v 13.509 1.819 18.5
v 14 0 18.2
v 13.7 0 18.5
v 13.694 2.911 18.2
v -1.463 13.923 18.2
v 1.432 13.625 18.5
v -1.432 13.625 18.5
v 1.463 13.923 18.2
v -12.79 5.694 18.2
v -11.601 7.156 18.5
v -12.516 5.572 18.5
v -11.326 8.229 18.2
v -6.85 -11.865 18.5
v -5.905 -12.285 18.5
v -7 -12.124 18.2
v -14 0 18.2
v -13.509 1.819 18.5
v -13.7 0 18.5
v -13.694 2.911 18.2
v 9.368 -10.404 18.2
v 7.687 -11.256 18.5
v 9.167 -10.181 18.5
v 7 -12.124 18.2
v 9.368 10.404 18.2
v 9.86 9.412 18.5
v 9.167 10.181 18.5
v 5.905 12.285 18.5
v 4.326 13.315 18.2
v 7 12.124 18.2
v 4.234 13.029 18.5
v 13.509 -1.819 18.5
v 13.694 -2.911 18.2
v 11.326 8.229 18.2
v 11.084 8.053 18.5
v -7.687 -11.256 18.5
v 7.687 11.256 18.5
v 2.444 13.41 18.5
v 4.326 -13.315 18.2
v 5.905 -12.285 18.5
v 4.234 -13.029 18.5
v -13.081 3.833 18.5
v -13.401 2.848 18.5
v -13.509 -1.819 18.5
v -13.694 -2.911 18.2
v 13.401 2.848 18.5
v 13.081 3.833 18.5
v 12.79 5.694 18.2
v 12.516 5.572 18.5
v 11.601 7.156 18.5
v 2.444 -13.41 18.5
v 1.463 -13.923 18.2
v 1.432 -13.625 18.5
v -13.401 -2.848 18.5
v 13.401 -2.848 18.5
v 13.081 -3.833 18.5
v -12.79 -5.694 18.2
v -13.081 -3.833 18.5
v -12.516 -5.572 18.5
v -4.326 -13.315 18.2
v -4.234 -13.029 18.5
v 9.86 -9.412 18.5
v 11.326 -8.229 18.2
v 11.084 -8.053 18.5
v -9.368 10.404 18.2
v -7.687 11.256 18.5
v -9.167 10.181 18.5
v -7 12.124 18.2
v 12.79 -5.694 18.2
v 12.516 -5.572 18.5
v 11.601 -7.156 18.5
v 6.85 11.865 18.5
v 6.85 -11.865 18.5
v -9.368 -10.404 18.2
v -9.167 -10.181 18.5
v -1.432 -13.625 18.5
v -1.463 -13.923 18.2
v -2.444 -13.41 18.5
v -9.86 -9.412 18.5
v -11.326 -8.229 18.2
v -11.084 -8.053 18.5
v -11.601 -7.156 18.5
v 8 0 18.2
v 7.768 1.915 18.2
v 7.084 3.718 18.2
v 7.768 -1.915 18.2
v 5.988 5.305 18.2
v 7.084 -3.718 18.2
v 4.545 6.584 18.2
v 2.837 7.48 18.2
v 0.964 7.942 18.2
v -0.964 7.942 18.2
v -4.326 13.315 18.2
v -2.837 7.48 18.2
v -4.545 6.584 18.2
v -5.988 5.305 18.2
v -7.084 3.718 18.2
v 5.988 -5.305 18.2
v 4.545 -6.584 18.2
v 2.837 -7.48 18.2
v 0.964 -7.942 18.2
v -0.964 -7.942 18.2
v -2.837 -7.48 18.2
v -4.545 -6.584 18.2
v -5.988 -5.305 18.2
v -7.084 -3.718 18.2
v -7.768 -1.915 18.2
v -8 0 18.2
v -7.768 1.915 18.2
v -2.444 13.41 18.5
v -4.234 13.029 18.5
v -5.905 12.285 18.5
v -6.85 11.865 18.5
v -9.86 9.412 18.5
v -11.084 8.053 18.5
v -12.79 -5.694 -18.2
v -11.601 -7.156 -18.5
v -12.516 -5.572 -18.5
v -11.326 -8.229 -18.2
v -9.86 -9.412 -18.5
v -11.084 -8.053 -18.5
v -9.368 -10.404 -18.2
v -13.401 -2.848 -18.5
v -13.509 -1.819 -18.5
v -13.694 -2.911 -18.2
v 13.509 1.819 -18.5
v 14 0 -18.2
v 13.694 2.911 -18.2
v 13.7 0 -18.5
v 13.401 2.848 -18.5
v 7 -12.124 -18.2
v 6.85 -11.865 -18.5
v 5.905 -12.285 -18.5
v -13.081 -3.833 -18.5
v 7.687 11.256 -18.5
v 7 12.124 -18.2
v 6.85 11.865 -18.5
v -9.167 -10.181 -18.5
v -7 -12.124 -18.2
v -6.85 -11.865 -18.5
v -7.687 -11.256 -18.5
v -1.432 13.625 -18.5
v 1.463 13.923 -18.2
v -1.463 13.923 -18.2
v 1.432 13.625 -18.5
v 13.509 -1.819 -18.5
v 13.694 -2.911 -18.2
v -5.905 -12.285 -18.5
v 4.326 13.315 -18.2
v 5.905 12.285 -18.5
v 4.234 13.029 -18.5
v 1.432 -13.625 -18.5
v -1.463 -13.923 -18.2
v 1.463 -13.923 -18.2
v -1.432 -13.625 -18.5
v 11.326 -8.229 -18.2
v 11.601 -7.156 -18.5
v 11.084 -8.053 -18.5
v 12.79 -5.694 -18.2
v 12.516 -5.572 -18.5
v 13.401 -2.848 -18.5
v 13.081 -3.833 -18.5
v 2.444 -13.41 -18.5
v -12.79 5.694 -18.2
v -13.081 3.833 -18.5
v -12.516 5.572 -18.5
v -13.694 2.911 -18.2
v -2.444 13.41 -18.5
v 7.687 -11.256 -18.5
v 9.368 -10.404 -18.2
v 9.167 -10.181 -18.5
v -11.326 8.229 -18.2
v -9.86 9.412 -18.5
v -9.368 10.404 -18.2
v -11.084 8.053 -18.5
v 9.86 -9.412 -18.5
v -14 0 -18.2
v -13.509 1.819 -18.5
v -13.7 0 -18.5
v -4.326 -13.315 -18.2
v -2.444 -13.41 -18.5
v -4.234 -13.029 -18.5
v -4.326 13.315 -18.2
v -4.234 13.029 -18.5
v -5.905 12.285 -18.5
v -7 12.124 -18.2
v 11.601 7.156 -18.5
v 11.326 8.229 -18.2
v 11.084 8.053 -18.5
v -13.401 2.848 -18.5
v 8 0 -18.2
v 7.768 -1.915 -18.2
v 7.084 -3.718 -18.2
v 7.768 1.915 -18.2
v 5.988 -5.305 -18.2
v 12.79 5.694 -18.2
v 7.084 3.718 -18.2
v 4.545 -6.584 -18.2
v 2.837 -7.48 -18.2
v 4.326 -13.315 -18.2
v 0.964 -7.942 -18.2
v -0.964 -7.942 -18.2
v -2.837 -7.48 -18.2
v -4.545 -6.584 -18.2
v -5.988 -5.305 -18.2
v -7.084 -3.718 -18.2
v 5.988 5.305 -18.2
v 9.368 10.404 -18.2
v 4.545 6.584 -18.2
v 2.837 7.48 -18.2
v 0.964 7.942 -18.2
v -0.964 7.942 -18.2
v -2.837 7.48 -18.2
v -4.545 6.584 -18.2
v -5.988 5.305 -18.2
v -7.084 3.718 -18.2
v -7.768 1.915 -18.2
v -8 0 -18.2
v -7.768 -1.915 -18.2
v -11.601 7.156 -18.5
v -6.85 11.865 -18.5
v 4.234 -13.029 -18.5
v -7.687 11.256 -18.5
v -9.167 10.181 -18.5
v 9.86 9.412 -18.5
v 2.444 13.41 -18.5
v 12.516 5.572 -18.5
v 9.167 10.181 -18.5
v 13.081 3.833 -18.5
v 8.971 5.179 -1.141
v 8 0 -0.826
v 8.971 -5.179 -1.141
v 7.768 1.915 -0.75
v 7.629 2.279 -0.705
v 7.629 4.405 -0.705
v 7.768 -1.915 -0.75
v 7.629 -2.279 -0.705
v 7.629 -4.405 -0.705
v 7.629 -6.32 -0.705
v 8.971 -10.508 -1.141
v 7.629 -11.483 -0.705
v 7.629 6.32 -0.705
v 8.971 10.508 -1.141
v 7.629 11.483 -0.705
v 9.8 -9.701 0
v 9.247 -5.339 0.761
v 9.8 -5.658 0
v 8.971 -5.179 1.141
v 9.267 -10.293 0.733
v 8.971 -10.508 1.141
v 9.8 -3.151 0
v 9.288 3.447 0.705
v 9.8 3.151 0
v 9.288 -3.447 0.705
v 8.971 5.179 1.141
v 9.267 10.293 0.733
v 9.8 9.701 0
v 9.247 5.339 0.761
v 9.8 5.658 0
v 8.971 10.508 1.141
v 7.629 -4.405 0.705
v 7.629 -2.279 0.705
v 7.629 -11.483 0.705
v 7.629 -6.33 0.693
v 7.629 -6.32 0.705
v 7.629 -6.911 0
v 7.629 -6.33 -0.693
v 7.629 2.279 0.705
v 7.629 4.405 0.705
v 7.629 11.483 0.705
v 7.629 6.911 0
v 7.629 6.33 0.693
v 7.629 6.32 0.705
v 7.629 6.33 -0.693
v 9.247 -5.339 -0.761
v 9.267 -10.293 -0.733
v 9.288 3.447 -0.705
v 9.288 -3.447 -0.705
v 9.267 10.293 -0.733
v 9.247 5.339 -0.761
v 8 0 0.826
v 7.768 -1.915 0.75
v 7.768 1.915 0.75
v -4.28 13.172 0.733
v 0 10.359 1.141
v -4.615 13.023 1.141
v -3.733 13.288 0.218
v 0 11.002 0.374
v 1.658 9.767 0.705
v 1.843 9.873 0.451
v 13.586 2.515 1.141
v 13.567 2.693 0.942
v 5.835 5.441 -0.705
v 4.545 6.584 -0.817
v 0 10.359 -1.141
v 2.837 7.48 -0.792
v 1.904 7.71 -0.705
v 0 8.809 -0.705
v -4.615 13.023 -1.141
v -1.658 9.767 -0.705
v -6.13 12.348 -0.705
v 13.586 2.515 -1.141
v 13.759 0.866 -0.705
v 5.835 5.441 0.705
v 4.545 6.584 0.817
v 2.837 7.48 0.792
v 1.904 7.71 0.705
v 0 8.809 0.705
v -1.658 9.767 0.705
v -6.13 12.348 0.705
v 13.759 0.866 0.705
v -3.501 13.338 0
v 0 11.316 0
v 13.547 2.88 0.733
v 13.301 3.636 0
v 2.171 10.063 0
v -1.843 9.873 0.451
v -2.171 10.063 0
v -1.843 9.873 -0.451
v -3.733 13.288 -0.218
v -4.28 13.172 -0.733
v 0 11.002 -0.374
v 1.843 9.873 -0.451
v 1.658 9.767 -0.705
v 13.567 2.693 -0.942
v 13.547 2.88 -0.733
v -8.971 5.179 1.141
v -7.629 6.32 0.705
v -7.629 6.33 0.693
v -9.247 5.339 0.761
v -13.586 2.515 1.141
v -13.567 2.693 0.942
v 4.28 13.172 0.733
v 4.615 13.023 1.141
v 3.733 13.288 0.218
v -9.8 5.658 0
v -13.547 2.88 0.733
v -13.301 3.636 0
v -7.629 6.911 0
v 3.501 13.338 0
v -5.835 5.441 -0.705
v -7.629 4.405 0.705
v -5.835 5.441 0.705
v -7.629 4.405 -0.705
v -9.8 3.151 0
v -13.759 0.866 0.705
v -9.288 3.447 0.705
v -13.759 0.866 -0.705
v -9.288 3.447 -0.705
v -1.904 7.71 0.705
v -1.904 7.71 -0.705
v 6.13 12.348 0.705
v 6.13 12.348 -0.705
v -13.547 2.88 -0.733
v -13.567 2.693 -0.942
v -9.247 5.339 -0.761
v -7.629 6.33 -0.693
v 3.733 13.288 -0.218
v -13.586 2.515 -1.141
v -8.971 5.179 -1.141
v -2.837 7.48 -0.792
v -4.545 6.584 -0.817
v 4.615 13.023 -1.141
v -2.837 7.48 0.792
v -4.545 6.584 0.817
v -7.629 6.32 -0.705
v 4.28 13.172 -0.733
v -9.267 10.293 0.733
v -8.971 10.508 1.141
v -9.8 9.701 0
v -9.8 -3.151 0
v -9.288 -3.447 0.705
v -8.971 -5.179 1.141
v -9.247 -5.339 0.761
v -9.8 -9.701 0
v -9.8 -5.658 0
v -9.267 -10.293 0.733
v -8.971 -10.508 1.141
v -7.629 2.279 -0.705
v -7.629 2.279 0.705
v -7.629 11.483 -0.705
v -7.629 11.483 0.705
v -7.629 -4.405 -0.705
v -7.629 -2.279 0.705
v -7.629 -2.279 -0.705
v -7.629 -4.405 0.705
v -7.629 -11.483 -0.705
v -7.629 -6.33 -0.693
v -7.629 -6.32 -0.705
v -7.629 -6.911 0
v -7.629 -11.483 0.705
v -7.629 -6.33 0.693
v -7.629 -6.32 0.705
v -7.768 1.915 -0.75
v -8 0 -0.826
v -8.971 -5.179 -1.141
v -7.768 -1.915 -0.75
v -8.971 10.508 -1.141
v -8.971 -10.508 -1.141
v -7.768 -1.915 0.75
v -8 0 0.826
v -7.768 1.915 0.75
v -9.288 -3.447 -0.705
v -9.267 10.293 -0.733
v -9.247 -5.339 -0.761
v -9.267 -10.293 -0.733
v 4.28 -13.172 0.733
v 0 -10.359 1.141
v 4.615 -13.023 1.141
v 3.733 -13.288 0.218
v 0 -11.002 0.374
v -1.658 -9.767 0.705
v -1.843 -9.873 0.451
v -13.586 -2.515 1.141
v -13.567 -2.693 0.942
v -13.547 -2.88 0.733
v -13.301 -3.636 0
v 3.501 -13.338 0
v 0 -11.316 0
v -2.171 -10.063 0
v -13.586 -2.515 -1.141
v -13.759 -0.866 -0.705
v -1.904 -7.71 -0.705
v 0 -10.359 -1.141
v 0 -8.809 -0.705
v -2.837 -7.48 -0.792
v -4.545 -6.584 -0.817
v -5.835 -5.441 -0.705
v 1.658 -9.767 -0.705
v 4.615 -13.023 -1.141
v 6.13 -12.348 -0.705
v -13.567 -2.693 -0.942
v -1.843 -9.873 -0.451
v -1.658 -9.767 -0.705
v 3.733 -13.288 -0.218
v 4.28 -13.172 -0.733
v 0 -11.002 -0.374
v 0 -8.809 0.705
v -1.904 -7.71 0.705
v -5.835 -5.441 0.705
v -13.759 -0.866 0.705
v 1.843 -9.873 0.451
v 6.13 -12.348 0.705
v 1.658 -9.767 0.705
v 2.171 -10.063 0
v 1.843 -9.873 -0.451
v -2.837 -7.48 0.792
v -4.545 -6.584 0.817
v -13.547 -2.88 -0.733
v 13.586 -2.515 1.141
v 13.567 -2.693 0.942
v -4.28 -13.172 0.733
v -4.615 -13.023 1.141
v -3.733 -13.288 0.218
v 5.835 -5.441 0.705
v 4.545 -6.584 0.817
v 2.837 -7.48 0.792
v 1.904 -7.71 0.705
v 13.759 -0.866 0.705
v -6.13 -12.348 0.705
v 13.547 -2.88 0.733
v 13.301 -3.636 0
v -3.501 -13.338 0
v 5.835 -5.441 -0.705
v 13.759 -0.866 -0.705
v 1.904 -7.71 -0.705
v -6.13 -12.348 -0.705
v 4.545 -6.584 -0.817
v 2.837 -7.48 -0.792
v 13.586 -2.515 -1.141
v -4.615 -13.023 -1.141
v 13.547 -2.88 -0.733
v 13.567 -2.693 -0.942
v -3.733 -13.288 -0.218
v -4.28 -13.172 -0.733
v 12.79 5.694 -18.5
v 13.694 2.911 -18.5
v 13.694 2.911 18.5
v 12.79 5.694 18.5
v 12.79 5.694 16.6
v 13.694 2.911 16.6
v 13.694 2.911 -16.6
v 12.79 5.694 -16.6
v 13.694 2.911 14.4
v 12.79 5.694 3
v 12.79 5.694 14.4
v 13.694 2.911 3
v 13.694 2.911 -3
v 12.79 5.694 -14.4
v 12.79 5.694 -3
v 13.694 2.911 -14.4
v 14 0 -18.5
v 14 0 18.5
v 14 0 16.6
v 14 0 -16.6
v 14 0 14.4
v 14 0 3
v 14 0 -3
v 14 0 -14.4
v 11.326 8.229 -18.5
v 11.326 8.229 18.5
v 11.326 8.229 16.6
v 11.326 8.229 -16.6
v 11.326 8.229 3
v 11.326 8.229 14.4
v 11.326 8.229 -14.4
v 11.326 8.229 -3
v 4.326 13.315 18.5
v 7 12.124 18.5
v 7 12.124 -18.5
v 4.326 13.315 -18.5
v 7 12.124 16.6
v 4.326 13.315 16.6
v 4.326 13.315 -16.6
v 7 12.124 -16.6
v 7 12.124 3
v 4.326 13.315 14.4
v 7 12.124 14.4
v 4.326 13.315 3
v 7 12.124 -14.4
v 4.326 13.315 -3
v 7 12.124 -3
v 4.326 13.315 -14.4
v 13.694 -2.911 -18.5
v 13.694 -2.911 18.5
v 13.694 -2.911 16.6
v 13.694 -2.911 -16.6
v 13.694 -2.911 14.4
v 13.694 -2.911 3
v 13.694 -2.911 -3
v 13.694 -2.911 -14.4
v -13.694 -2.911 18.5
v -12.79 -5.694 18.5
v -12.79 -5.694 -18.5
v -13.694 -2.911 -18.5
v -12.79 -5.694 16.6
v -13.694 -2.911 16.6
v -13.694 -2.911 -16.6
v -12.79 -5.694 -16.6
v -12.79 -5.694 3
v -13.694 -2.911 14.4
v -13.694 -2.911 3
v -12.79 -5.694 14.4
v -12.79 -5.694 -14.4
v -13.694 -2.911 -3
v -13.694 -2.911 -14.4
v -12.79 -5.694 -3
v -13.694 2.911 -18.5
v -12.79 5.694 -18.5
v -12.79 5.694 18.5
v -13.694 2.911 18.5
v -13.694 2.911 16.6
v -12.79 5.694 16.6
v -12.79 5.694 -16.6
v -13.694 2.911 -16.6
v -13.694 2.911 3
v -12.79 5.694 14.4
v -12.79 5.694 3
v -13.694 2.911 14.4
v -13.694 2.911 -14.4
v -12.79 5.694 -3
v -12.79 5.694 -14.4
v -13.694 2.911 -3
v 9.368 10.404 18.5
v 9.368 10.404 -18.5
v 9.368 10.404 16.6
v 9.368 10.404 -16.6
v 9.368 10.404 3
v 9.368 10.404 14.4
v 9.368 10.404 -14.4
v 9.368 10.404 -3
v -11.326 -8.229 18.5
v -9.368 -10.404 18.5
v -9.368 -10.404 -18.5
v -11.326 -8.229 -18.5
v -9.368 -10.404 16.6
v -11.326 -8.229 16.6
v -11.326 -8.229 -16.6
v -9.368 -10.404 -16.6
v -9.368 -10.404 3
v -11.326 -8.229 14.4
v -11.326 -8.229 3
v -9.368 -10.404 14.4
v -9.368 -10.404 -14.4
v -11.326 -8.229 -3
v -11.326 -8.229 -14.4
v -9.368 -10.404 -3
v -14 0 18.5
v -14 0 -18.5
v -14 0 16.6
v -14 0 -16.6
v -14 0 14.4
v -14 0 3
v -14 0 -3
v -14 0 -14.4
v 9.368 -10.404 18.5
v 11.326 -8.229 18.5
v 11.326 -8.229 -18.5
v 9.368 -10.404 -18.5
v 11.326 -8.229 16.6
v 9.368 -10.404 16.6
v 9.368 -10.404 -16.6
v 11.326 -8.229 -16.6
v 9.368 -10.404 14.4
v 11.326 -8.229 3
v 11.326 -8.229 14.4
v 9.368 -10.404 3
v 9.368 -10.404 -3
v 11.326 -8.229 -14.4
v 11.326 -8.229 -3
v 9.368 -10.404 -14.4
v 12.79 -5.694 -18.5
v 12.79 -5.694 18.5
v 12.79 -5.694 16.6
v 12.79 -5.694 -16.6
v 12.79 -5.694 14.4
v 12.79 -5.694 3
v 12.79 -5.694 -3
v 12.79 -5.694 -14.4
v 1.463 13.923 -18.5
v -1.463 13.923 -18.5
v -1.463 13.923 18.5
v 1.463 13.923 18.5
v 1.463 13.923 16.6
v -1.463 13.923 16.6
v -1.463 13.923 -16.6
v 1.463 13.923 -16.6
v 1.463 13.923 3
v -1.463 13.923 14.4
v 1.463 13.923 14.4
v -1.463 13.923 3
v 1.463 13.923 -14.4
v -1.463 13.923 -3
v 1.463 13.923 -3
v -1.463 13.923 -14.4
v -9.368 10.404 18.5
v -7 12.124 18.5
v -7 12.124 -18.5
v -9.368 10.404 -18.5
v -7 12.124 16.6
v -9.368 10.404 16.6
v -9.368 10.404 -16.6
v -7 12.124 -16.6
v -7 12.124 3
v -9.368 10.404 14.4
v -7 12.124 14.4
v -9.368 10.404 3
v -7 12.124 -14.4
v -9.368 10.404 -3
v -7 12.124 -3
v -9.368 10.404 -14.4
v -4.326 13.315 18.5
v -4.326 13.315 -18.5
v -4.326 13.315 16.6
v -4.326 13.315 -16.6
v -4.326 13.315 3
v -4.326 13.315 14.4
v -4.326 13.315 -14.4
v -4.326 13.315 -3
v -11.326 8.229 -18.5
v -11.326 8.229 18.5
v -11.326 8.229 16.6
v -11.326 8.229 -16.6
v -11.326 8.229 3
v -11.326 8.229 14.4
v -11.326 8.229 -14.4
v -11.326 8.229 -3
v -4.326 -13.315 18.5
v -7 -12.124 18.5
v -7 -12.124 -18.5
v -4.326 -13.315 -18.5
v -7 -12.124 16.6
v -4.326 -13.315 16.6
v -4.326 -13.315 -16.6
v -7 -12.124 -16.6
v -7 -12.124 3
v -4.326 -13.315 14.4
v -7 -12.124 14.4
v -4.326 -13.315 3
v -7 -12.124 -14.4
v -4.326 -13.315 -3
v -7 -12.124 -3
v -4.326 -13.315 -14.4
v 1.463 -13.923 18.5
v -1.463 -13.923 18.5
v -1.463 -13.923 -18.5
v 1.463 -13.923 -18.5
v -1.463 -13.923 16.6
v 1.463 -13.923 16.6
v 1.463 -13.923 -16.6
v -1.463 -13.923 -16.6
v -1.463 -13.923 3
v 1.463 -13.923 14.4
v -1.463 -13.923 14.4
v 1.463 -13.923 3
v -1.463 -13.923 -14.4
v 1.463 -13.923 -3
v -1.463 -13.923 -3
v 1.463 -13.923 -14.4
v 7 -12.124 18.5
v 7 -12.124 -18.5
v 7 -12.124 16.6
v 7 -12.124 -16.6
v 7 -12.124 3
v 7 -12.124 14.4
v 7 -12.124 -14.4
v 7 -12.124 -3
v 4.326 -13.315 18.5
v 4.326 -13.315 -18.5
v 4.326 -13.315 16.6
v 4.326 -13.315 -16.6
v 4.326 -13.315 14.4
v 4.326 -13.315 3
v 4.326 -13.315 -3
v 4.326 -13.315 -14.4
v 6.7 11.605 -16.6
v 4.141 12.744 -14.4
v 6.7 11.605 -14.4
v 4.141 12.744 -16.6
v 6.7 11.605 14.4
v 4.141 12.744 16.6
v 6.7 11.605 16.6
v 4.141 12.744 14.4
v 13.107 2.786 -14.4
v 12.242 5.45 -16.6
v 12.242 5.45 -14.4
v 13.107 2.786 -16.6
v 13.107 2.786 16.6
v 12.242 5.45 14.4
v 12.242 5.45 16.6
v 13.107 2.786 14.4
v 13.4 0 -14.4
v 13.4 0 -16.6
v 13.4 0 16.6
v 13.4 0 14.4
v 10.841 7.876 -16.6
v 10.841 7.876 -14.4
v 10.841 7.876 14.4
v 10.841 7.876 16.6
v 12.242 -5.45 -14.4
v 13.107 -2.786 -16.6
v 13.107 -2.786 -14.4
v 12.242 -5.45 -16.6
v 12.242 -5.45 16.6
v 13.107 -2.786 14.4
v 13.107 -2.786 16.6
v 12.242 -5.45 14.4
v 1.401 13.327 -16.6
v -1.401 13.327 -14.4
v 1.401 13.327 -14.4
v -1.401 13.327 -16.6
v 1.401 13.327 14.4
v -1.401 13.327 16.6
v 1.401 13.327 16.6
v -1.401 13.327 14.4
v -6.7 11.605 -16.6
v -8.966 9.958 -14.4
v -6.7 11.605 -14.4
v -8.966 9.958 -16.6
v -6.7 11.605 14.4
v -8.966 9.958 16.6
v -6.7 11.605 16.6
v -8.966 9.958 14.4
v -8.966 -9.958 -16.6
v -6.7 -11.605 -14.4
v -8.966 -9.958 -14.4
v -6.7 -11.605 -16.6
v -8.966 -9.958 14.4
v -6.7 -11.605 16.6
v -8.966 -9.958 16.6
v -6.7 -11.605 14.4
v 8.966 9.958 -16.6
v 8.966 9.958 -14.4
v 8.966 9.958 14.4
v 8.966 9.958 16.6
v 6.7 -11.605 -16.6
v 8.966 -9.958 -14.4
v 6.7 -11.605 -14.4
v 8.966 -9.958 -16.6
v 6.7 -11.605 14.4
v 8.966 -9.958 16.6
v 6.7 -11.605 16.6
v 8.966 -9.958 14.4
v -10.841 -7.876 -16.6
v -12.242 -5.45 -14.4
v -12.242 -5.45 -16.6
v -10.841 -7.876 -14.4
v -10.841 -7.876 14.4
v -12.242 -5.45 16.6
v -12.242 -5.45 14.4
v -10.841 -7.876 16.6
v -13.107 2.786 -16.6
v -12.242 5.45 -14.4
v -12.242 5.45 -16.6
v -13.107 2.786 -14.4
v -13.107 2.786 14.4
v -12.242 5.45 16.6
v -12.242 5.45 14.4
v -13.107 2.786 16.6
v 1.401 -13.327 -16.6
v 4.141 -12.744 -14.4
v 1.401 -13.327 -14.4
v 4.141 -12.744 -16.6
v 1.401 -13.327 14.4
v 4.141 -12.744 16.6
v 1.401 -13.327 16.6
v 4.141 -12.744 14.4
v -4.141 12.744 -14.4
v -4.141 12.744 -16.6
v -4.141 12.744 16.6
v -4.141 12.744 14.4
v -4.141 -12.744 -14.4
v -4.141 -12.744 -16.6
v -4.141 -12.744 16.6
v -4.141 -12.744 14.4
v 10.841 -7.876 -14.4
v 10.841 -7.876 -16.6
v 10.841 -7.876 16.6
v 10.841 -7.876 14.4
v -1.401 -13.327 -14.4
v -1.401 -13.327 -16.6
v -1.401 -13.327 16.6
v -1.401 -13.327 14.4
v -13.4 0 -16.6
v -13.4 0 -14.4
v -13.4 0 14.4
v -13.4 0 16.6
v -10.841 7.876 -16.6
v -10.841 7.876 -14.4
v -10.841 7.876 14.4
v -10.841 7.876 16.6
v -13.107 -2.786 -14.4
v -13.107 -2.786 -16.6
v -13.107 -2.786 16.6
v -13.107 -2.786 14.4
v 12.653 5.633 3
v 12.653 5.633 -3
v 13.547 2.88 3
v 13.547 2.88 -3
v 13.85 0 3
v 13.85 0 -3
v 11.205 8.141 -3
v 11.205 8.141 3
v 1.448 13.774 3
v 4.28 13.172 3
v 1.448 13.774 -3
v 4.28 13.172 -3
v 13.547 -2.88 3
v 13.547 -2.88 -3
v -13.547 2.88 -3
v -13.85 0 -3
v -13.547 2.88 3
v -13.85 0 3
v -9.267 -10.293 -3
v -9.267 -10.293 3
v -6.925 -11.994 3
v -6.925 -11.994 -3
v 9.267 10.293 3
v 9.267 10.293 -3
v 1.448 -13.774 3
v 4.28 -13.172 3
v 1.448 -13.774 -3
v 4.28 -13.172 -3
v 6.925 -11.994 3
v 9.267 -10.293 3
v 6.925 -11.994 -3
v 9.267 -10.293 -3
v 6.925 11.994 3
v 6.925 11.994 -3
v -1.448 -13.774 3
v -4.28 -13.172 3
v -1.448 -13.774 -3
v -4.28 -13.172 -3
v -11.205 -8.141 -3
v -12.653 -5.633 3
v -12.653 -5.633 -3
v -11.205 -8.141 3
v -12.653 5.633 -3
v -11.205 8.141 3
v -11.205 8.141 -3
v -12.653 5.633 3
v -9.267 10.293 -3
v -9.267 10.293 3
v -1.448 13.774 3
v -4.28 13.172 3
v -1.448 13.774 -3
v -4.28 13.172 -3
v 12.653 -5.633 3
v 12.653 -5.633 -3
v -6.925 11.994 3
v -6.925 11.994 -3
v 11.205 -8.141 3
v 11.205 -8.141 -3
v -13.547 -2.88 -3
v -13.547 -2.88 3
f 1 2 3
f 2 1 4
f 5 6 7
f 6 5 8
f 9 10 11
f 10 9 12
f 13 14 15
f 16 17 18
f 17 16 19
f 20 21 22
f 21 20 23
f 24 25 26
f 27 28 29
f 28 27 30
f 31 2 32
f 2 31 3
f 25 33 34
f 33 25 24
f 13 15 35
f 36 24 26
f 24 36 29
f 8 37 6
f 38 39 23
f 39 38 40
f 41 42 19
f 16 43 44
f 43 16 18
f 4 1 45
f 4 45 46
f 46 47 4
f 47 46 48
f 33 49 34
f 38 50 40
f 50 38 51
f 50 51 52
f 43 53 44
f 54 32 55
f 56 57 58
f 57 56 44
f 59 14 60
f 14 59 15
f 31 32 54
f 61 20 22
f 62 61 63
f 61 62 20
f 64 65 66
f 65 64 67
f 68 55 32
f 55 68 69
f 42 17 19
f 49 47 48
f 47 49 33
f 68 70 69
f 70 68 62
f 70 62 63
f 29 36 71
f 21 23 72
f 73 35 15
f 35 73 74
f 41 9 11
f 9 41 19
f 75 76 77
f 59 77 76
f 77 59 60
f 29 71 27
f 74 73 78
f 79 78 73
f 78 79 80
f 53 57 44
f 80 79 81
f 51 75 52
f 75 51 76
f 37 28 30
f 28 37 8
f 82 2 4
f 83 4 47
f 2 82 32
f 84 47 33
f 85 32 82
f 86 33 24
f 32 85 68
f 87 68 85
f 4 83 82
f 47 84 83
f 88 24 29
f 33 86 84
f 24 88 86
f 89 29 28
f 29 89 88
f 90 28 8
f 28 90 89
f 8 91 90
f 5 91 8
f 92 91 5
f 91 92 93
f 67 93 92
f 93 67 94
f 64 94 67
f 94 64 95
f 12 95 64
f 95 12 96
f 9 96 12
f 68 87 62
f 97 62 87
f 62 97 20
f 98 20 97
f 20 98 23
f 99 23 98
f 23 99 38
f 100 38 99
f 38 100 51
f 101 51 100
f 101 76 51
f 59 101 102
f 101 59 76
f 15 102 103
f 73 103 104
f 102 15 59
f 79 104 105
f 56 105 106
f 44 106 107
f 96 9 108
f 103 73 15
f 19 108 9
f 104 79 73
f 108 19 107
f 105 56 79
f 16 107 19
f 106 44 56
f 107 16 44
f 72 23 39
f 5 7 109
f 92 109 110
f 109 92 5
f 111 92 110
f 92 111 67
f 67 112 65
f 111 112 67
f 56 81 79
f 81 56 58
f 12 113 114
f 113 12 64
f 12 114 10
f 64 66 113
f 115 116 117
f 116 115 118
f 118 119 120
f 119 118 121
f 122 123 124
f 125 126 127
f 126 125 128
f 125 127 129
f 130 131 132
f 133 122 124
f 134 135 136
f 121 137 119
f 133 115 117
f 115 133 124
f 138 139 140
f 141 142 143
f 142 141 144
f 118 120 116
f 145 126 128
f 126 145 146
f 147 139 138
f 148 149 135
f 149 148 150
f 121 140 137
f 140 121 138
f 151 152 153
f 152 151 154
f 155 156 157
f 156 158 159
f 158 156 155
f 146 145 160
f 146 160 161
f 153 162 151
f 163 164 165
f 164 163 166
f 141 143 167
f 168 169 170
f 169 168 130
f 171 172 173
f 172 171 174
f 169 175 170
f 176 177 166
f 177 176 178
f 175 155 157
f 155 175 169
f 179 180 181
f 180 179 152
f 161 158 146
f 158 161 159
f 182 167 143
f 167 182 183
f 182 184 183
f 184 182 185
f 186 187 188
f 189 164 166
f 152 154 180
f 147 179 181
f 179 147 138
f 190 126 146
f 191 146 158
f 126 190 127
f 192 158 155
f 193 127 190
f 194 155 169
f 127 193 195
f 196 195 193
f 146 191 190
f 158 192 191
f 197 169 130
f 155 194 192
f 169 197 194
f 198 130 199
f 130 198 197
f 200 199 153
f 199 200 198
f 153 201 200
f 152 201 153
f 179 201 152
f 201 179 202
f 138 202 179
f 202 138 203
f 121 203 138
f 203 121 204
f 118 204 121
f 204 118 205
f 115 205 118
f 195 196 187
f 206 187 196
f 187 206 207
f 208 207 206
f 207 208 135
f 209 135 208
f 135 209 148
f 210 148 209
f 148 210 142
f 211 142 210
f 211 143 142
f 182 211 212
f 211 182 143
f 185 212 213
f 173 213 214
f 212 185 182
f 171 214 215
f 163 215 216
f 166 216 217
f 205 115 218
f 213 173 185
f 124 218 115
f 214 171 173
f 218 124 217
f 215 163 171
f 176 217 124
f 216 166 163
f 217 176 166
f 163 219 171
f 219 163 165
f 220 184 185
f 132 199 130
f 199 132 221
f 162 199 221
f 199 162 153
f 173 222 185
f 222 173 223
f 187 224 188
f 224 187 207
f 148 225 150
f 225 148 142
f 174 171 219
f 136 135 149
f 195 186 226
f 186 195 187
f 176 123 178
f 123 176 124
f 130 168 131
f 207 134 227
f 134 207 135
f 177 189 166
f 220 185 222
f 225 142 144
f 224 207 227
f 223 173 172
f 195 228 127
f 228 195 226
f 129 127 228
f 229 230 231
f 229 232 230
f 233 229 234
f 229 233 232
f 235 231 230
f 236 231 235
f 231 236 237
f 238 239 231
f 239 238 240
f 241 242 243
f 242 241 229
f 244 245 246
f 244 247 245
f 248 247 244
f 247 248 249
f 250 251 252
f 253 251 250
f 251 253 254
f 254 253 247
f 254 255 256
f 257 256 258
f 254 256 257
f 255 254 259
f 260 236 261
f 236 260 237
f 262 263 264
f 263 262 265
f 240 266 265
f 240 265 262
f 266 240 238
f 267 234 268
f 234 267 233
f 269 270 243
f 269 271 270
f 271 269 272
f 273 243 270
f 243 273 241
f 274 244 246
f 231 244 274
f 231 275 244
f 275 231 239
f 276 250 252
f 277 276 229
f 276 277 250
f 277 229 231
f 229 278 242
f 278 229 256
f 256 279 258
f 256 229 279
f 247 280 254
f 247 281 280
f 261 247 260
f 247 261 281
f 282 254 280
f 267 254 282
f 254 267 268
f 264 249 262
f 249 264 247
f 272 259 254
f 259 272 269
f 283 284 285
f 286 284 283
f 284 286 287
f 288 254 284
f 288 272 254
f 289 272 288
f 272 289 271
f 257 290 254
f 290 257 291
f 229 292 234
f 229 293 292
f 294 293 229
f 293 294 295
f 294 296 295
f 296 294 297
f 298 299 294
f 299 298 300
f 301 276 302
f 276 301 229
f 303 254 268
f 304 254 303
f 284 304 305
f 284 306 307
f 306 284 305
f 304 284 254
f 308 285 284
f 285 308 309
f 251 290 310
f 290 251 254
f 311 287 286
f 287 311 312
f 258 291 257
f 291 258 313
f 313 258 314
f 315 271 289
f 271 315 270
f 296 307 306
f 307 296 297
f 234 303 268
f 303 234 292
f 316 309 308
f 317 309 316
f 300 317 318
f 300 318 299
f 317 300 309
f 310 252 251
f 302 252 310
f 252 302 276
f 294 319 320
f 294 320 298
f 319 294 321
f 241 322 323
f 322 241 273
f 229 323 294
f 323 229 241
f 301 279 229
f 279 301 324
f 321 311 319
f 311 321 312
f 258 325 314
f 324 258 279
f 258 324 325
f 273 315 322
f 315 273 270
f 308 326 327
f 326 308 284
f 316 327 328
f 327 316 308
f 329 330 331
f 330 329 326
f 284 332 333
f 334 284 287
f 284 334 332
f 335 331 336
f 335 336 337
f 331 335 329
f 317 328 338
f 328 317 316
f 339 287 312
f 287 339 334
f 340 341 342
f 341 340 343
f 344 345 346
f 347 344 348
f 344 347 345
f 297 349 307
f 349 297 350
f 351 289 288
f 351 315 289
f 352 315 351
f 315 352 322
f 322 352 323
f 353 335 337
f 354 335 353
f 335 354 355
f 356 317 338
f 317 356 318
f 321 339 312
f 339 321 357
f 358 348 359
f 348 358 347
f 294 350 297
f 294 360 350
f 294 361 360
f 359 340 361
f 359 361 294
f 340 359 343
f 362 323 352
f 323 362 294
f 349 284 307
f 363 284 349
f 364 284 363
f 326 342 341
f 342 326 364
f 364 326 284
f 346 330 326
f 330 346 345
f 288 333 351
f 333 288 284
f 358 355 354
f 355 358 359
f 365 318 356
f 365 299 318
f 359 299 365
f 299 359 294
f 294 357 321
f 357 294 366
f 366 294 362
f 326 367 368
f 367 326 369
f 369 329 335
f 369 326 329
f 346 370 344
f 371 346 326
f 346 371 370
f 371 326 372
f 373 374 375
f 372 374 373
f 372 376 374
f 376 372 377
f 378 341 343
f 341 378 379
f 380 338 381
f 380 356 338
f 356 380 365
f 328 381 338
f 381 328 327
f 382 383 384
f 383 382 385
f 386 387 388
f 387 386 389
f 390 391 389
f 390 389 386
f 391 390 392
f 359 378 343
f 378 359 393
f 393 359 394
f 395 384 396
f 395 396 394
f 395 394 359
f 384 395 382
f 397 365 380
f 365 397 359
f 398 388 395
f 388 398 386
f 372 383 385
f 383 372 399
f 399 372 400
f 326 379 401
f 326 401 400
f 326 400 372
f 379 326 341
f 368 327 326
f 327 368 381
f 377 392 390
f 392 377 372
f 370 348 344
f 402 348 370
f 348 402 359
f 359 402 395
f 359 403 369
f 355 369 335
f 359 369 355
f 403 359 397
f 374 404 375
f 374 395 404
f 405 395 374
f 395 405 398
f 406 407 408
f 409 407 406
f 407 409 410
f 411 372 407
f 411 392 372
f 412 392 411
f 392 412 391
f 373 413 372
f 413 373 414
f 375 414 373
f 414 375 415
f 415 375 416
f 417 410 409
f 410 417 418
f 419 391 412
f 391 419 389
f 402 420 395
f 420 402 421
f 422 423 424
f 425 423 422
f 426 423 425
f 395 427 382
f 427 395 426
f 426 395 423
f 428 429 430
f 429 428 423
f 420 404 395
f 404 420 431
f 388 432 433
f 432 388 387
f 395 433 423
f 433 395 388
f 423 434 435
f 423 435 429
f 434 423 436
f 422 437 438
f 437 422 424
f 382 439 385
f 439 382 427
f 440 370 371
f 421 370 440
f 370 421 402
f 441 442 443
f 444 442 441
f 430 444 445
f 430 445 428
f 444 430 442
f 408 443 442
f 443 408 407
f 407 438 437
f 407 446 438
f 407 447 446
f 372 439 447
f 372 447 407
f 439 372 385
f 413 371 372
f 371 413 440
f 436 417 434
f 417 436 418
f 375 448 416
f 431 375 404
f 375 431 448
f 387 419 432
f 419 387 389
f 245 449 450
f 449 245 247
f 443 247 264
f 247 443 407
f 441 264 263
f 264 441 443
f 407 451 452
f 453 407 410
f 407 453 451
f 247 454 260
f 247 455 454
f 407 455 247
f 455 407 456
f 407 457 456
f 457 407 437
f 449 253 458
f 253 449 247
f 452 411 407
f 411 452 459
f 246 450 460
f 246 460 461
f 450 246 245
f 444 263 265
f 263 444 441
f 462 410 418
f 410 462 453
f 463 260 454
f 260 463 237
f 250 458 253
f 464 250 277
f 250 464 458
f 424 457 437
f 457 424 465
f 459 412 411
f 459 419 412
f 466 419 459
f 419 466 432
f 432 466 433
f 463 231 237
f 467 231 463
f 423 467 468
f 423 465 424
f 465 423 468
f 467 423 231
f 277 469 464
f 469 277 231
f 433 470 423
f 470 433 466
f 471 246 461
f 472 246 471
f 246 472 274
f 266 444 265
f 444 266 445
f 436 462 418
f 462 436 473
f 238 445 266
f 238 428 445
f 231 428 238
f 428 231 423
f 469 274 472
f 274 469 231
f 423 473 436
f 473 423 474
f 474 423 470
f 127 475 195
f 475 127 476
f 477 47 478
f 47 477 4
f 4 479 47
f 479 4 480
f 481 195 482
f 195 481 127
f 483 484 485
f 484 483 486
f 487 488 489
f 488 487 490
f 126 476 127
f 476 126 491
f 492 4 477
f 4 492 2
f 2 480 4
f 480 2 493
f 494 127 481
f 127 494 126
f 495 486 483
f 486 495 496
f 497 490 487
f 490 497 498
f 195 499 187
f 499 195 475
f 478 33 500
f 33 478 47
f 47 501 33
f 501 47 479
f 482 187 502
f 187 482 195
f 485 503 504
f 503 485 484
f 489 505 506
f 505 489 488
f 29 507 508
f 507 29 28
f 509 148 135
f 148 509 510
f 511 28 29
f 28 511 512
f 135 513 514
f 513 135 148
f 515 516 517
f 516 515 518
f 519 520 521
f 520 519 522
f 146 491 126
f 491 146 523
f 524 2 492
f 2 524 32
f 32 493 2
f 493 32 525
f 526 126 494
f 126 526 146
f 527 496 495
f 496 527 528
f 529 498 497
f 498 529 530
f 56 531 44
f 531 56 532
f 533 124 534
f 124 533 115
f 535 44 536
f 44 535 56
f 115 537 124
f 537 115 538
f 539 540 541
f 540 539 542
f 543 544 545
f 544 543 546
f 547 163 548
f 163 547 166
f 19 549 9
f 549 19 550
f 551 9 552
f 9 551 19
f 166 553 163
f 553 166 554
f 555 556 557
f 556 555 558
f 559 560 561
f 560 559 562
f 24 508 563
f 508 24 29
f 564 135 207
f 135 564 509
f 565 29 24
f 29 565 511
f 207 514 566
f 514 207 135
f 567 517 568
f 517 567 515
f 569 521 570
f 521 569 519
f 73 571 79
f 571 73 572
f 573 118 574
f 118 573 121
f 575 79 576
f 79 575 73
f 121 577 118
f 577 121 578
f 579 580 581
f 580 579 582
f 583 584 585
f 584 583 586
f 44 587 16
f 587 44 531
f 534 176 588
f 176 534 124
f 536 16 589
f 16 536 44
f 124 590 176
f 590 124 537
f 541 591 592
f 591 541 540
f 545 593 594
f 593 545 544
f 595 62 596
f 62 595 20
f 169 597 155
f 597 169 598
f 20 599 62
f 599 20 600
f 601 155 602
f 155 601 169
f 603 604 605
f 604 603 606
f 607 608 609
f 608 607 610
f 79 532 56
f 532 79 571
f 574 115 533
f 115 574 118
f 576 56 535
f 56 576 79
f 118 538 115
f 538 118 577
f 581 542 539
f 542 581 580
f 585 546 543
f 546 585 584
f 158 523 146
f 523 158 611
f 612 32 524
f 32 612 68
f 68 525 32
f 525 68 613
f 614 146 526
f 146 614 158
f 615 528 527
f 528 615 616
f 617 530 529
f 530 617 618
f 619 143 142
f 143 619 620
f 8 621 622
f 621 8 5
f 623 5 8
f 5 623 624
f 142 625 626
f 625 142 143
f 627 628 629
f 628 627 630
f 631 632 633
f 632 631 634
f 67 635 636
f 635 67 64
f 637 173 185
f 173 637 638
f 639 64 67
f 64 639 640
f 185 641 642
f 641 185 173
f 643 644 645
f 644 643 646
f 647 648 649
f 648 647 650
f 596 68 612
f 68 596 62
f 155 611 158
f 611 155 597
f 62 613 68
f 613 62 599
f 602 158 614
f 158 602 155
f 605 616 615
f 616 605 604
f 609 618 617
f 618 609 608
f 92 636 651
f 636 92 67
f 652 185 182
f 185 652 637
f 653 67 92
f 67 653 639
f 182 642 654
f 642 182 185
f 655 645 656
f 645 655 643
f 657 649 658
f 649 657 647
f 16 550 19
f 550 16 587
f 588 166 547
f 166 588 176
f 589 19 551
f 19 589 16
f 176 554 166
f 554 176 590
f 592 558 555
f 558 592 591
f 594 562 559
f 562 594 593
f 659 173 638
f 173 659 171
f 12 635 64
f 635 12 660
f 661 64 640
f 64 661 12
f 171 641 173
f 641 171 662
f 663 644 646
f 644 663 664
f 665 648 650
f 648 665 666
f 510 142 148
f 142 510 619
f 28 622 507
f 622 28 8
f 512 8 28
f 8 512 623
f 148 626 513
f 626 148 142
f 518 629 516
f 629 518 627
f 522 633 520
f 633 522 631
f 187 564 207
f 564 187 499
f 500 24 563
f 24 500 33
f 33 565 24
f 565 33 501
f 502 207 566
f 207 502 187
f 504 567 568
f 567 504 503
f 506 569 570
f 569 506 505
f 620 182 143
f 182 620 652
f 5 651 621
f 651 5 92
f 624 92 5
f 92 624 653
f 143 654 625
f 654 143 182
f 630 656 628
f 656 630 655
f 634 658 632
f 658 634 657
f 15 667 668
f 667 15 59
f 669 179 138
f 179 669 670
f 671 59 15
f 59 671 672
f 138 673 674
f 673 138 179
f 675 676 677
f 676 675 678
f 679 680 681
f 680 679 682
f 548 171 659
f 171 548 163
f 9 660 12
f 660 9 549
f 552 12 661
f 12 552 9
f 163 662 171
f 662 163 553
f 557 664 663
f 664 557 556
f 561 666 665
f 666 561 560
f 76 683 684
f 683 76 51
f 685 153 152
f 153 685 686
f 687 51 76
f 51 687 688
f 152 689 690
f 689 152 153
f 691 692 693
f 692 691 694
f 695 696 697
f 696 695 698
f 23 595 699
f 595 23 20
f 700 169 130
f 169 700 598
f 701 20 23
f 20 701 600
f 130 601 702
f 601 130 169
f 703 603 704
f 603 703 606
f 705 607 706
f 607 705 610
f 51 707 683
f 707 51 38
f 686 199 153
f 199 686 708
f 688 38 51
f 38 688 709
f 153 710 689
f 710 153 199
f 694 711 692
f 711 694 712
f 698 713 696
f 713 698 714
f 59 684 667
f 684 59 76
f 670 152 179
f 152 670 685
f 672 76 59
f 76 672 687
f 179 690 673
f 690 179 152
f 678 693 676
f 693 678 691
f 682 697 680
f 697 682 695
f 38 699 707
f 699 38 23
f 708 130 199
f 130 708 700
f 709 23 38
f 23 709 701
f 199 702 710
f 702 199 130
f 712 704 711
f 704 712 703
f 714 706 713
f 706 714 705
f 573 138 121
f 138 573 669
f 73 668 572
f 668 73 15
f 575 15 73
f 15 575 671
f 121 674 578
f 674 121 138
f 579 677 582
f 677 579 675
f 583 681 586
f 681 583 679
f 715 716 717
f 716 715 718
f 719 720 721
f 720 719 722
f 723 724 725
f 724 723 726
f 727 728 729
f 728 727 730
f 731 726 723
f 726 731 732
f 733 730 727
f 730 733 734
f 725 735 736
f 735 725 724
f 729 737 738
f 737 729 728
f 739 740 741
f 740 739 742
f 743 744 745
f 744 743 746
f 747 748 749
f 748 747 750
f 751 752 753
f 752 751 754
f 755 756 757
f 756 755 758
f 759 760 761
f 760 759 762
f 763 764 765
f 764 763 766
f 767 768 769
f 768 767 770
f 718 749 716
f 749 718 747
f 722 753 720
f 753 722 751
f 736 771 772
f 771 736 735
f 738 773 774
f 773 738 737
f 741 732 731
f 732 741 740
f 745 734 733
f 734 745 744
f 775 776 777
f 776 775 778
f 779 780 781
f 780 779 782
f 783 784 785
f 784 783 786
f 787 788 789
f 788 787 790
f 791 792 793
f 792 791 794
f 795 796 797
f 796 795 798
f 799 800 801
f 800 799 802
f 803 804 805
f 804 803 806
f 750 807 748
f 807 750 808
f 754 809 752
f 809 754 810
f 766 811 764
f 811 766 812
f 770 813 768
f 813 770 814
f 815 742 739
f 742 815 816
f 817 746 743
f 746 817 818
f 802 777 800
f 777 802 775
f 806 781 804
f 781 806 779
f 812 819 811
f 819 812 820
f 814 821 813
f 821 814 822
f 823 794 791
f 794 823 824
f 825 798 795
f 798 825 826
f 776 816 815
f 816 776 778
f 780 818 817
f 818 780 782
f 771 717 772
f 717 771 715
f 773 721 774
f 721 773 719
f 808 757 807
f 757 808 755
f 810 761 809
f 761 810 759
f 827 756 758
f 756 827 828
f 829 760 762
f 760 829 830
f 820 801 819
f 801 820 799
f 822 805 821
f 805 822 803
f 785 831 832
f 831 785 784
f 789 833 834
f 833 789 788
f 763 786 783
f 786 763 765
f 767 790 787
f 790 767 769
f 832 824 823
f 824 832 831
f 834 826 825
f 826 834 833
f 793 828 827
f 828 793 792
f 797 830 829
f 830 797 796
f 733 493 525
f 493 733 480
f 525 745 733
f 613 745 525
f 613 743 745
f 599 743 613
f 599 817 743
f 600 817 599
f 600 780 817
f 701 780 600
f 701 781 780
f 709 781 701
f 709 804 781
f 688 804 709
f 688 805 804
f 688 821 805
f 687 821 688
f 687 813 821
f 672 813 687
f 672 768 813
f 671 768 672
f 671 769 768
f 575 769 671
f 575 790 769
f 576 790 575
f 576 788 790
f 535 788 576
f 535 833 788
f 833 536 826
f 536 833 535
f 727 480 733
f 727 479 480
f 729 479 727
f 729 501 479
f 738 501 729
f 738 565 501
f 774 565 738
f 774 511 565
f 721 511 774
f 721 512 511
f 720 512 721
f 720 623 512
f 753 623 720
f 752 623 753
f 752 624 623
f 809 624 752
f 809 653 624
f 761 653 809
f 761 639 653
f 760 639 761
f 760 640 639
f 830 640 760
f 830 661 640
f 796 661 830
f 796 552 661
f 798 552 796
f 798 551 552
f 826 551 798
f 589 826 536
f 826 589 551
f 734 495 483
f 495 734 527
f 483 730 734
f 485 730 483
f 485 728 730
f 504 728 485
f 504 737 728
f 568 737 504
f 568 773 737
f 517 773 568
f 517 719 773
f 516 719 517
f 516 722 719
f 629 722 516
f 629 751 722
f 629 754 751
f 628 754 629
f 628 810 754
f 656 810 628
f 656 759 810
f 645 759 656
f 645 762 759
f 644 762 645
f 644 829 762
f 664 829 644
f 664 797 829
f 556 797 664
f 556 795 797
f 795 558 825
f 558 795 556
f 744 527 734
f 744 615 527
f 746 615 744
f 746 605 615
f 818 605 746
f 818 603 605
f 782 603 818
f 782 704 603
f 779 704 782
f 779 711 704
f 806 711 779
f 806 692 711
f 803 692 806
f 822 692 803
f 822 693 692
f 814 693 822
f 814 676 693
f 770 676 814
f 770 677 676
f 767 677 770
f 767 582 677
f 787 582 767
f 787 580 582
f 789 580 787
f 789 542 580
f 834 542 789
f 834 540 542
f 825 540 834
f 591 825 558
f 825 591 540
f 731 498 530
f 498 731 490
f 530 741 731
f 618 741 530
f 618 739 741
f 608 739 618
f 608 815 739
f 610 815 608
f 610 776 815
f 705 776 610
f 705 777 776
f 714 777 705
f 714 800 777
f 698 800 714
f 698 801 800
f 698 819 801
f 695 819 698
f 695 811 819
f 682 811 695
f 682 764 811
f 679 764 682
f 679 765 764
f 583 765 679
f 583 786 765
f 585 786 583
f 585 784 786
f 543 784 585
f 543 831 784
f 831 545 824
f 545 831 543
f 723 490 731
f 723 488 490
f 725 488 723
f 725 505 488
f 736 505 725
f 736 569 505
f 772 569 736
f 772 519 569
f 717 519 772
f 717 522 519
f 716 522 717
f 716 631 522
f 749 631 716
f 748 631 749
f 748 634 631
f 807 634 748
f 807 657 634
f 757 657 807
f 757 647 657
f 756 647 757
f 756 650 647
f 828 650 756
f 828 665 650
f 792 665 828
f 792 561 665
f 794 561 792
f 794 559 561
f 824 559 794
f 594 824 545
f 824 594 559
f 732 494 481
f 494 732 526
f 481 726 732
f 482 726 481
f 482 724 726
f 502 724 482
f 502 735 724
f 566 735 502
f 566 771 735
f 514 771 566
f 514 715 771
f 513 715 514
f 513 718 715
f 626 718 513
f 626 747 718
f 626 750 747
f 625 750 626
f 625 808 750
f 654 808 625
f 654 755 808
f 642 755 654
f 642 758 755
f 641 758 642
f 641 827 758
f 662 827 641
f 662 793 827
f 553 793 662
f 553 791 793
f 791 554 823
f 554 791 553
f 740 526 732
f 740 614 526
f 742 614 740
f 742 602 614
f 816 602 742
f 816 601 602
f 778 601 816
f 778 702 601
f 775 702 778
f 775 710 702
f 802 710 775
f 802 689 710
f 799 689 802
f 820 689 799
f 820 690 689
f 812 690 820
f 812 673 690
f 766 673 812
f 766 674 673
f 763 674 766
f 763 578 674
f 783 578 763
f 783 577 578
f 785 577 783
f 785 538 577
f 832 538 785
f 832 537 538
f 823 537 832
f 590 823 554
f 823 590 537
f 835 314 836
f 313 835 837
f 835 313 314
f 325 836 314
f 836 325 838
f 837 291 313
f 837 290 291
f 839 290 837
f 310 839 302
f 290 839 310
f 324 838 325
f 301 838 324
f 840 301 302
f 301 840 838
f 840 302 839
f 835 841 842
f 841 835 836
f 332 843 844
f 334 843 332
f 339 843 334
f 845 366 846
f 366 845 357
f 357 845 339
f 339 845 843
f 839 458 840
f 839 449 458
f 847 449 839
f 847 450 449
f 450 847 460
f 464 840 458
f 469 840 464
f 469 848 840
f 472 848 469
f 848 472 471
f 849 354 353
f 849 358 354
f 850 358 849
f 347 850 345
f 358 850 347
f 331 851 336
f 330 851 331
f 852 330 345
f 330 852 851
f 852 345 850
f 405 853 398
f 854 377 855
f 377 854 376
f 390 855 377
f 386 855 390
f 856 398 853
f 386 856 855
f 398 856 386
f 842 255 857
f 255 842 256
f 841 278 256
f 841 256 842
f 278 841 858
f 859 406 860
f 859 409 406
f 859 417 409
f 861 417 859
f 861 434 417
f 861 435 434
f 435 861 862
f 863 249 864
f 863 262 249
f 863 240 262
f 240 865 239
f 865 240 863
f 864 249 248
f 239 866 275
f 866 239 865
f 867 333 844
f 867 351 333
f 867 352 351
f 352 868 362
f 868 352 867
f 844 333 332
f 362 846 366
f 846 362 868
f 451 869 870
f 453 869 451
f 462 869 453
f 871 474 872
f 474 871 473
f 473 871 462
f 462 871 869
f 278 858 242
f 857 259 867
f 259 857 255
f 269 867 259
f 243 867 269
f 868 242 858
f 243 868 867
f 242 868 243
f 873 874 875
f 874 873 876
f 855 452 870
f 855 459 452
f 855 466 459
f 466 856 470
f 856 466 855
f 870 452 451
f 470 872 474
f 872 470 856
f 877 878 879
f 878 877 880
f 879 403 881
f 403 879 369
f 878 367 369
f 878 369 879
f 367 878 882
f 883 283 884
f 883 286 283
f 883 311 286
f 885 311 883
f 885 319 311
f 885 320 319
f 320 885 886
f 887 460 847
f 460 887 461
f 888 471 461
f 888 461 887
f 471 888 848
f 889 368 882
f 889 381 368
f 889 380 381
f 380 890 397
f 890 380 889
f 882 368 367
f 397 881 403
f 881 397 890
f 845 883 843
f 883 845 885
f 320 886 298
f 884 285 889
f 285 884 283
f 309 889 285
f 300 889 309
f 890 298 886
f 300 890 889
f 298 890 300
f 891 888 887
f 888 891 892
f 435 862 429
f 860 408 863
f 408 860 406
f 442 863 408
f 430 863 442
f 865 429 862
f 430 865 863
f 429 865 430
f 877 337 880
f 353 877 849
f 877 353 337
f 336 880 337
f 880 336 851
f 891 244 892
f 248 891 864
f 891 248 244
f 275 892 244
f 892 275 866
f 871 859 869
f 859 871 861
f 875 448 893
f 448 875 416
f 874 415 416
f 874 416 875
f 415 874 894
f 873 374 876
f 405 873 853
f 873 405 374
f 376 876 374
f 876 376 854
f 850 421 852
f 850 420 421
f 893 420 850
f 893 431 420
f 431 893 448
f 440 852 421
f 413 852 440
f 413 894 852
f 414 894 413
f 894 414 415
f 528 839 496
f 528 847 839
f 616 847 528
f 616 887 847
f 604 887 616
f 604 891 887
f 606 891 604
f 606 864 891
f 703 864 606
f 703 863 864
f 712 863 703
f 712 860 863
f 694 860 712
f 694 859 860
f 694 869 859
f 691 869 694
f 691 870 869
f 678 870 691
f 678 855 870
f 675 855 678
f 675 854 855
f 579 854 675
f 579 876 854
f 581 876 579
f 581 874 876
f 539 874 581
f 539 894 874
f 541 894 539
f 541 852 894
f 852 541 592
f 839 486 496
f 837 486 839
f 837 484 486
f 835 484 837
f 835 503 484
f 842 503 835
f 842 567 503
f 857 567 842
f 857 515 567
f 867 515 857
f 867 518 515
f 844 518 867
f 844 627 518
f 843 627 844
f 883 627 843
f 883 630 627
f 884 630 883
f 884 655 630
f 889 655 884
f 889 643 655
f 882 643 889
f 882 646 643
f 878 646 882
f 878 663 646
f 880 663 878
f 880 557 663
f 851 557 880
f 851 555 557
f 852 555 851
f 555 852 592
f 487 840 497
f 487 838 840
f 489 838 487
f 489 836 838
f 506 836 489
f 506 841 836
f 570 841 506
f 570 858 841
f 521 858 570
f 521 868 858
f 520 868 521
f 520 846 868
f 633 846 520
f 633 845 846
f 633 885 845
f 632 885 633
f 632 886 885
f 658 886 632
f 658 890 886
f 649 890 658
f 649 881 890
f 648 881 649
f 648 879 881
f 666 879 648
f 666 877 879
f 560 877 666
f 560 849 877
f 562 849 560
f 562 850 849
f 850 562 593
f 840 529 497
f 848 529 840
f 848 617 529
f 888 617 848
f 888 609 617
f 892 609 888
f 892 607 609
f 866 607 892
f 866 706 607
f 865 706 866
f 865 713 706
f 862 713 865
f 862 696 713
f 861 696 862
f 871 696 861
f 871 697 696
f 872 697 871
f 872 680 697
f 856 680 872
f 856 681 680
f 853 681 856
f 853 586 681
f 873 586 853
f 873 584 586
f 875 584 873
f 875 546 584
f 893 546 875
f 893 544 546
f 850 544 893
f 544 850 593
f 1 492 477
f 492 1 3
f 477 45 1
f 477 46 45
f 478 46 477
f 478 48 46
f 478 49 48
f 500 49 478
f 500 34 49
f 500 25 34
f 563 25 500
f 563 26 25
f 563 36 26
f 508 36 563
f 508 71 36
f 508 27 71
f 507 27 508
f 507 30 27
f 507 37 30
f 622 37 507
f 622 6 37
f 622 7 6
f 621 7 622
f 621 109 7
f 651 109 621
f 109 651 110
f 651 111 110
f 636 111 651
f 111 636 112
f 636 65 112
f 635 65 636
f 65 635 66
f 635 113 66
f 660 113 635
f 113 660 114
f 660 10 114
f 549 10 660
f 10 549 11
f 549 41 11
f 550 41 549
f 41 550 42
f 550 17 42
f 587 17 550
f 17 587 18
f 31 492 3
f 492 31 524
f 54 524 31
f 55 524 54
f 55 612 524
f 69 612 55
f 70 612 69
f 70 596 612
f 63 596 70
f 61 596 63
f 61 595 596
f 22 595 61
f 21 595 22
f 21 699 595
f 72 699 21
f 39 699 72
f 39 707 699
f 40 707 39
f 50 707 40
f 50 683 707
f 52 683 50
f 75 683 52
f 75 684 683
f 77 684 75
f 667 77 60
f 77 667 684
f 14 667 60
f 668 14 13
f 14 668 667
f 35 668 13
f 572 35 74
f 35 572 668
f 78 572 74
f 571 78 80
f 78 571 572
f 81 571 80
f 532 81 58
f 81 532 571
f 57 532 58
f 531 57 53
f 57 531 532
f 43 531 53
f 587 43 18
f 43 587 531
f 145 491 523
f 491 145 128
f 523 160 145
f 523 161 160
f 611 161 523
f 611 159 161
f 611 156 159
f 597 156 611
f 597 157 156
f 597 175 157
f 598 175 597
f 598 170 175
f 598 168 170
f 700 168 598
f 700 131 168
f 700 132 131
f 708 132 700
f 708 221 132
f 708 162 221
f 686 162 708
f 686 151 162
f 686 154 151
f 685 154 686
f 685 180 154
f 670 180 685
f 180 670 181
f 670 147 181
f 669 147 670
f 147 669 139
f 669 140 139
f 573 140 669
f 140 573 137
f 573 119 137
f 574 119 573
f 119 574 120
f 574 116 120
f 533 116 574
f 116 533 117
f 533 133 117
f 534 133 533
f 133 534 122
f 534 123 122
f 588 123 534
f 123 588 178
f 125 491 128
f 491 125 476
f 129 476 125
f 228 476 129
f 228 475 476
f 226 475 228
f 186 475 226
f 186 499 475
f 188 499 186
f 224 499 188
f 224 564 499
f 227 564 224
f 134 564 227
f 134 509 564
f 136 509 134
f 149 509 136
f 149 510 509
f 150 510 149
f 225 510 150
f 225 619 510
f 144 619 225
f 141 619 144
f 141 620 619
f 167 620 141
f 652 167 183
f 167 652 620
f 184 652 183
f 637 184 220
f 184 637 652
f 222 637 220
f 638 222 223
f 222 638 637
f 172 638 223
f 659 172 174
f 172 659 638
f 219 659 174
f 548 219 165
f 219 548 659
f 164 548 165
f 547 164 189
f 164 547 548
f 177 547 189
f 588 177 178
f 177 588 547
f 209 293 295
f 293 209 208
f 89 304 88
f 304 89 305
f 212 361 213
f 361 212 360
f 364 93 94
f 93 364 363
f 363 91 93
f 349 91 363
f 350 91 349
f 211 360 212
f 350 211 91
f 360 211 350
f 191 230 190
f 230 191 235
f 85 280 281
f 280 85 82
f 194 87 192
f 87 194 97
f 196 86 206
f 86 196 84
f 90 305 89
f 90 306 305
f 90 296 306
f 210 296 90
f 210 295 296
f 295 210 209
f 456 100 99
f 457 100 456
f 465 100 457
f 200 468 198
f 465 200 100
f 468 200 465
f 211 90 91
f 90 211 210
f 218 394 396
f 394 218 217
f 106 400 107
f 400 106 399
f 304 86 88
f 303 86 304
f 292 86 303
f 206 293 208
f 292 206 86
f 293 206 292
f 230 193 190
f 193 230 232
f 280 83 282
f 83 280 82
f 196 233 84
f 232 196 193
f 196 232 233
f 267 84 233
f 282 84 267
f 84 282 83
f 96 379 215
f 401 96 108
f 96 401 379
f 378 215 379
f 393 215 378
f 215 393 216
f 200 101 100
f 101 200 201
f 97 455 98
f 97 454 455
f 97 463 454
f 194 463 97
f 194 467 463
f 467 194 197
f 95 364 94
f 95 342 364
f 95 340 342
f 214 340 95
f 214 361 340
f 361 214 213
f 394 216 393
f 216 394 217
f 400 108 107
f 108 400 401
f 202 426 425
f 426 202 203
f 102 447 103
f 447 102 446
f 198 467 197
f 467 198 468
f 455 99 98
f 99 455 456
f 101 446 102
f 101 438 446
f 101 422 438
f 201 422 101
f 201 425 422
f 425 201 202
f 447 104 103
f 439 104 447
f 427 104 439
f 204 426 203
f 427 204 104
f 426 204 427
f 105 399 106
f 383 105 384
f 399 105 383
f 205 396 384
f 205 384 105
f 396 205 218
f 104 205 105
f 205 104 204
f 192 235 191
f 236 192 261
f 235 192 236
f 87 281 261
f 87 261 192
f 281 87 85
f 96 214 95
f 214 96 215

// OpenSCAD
// Parameters
bore_d = 16; //[8:32:0.1]
od_d = 28; //[14:56:0.1]
length = 37; //[18.5:74:0.1]
chamfer_len = 0.8; //[0.4:1.6:0.05]
overlap = 1; //[0.5:2:0.1]
seal_groove_width = 2.2; //[1.1:4.4:0.1]
seal_groove_depth = 0.6; //[0.3:1.2:0.05]
seal_groove_offset = 3; //[1.5:6:0.1]
mark_band_width = 6; //[3:12:0.1]
mark_band_depth = 0.15; //[0.05:0.4:0.01]
track_count = 6; //[4:8:1]
track_radius = 1.2; //[0.6:2.4:0.05]
track_length = 30; //[15:60:0.1]
track_inset = 0.6; //[0.2:1.5:0.05]

// Base Shapes
module outer_cylinder_body() {
  cylinder(h=length, r=od_d/2, center=true);
}

module through_bore() {
  cylinder(h=length + 2*overlap, r=bore_d/2, center=true);
}

module end_chamfer_cutter_pos() {
  translate([0, 0, length/2 - chamfer_len/2 + overlap/2])
    cylinder(h=chamfer_len, r1=od_d/2, r2=od_d/2 - chamfer_len, center=true);
}

module end_chamfer_cutter_neg() {
  translate([0, 0, -length/2 + chamfer_len/2 - overlap/2])
    cylinder(h=chamfer_len, r1=od_d/2 - chamfer_len, r2=od_d/2, center=true);
}

module seal_groove_cutter_pos() {
  translate([0, 0, length/2 - seal_groove_offset])
    cylinder(h=seal_groove_width, r=od_d/2, center=true);
}

module seal_groove_cutter_neg() {
  translate([0, 0, -length/2 + seal_groove_offset])
    cylinder(h=seal_groove_width, r=od_d/2, center=true);
}

module marking_band_cutter() {
  cylinder(h=mark_band_width, r=od_d/2, center=true);
}

module track_cutter_base() {
  translate([bore_d/2 + track_radius - track_inset, 0, 0])
    rotate([90, 0, 0])
    cylinder(h=track_length + 2*overlap, r=track_radius, center=true);
}

module seal_groove_depth_inner() {
  cylinder(h=length + 2*overlap, r=od_d/2 - seal_groove_depth, center=true);
}

module mark_band_depth_inner() {
  cylinder(h=length + 2*overlap, r=od_d/2 - mark_band_depth, center=true);
}

// Operations
module end_chamfers() {
  union() {
    end_chamfer_cutter_pos();
    end_chamfer_cutter_neg();
  }
}

module seal_grooves() {
  union() {
    seal_groove_cutter_pos();
    seal_groove_cutter_neg();
  }
}

module internal_ball_tracks_detail() {
  union() {
    for (i = [0:track_count-1]) {
      rotate([0, 0, i*360/track_count])
        track_cutter_base();
    }
  }
}

module seal_groove_depth_shell() {
  difference() {
    outer_cylinder_body();
    seal_groove_depth_inner();
  }
}

module mark_band_depth_shell() {
  difference() {
    outer_cylinder_body();
    mark_band_depth_inner();
  }
}

module seal_groove_depth_region() {
  intersection() {
    seal_groove_depth_shell();
    seal_grooves();
  }
}

module mark_band_depth_region() {
  intersection() {
    mark_band_depth_shell();
    marking_band_cutter();
  }
}

// Final Model
module complete_model() {
  difference() {
    outer_cylinder_body();
    through_bore();
    end_chamfers();
    internal_ball_tracks_detail();
    seal_groove_depth_region();
    mark_band_depth_region();
  }
}

// Render the complete model
color("Silver") complete_model();
